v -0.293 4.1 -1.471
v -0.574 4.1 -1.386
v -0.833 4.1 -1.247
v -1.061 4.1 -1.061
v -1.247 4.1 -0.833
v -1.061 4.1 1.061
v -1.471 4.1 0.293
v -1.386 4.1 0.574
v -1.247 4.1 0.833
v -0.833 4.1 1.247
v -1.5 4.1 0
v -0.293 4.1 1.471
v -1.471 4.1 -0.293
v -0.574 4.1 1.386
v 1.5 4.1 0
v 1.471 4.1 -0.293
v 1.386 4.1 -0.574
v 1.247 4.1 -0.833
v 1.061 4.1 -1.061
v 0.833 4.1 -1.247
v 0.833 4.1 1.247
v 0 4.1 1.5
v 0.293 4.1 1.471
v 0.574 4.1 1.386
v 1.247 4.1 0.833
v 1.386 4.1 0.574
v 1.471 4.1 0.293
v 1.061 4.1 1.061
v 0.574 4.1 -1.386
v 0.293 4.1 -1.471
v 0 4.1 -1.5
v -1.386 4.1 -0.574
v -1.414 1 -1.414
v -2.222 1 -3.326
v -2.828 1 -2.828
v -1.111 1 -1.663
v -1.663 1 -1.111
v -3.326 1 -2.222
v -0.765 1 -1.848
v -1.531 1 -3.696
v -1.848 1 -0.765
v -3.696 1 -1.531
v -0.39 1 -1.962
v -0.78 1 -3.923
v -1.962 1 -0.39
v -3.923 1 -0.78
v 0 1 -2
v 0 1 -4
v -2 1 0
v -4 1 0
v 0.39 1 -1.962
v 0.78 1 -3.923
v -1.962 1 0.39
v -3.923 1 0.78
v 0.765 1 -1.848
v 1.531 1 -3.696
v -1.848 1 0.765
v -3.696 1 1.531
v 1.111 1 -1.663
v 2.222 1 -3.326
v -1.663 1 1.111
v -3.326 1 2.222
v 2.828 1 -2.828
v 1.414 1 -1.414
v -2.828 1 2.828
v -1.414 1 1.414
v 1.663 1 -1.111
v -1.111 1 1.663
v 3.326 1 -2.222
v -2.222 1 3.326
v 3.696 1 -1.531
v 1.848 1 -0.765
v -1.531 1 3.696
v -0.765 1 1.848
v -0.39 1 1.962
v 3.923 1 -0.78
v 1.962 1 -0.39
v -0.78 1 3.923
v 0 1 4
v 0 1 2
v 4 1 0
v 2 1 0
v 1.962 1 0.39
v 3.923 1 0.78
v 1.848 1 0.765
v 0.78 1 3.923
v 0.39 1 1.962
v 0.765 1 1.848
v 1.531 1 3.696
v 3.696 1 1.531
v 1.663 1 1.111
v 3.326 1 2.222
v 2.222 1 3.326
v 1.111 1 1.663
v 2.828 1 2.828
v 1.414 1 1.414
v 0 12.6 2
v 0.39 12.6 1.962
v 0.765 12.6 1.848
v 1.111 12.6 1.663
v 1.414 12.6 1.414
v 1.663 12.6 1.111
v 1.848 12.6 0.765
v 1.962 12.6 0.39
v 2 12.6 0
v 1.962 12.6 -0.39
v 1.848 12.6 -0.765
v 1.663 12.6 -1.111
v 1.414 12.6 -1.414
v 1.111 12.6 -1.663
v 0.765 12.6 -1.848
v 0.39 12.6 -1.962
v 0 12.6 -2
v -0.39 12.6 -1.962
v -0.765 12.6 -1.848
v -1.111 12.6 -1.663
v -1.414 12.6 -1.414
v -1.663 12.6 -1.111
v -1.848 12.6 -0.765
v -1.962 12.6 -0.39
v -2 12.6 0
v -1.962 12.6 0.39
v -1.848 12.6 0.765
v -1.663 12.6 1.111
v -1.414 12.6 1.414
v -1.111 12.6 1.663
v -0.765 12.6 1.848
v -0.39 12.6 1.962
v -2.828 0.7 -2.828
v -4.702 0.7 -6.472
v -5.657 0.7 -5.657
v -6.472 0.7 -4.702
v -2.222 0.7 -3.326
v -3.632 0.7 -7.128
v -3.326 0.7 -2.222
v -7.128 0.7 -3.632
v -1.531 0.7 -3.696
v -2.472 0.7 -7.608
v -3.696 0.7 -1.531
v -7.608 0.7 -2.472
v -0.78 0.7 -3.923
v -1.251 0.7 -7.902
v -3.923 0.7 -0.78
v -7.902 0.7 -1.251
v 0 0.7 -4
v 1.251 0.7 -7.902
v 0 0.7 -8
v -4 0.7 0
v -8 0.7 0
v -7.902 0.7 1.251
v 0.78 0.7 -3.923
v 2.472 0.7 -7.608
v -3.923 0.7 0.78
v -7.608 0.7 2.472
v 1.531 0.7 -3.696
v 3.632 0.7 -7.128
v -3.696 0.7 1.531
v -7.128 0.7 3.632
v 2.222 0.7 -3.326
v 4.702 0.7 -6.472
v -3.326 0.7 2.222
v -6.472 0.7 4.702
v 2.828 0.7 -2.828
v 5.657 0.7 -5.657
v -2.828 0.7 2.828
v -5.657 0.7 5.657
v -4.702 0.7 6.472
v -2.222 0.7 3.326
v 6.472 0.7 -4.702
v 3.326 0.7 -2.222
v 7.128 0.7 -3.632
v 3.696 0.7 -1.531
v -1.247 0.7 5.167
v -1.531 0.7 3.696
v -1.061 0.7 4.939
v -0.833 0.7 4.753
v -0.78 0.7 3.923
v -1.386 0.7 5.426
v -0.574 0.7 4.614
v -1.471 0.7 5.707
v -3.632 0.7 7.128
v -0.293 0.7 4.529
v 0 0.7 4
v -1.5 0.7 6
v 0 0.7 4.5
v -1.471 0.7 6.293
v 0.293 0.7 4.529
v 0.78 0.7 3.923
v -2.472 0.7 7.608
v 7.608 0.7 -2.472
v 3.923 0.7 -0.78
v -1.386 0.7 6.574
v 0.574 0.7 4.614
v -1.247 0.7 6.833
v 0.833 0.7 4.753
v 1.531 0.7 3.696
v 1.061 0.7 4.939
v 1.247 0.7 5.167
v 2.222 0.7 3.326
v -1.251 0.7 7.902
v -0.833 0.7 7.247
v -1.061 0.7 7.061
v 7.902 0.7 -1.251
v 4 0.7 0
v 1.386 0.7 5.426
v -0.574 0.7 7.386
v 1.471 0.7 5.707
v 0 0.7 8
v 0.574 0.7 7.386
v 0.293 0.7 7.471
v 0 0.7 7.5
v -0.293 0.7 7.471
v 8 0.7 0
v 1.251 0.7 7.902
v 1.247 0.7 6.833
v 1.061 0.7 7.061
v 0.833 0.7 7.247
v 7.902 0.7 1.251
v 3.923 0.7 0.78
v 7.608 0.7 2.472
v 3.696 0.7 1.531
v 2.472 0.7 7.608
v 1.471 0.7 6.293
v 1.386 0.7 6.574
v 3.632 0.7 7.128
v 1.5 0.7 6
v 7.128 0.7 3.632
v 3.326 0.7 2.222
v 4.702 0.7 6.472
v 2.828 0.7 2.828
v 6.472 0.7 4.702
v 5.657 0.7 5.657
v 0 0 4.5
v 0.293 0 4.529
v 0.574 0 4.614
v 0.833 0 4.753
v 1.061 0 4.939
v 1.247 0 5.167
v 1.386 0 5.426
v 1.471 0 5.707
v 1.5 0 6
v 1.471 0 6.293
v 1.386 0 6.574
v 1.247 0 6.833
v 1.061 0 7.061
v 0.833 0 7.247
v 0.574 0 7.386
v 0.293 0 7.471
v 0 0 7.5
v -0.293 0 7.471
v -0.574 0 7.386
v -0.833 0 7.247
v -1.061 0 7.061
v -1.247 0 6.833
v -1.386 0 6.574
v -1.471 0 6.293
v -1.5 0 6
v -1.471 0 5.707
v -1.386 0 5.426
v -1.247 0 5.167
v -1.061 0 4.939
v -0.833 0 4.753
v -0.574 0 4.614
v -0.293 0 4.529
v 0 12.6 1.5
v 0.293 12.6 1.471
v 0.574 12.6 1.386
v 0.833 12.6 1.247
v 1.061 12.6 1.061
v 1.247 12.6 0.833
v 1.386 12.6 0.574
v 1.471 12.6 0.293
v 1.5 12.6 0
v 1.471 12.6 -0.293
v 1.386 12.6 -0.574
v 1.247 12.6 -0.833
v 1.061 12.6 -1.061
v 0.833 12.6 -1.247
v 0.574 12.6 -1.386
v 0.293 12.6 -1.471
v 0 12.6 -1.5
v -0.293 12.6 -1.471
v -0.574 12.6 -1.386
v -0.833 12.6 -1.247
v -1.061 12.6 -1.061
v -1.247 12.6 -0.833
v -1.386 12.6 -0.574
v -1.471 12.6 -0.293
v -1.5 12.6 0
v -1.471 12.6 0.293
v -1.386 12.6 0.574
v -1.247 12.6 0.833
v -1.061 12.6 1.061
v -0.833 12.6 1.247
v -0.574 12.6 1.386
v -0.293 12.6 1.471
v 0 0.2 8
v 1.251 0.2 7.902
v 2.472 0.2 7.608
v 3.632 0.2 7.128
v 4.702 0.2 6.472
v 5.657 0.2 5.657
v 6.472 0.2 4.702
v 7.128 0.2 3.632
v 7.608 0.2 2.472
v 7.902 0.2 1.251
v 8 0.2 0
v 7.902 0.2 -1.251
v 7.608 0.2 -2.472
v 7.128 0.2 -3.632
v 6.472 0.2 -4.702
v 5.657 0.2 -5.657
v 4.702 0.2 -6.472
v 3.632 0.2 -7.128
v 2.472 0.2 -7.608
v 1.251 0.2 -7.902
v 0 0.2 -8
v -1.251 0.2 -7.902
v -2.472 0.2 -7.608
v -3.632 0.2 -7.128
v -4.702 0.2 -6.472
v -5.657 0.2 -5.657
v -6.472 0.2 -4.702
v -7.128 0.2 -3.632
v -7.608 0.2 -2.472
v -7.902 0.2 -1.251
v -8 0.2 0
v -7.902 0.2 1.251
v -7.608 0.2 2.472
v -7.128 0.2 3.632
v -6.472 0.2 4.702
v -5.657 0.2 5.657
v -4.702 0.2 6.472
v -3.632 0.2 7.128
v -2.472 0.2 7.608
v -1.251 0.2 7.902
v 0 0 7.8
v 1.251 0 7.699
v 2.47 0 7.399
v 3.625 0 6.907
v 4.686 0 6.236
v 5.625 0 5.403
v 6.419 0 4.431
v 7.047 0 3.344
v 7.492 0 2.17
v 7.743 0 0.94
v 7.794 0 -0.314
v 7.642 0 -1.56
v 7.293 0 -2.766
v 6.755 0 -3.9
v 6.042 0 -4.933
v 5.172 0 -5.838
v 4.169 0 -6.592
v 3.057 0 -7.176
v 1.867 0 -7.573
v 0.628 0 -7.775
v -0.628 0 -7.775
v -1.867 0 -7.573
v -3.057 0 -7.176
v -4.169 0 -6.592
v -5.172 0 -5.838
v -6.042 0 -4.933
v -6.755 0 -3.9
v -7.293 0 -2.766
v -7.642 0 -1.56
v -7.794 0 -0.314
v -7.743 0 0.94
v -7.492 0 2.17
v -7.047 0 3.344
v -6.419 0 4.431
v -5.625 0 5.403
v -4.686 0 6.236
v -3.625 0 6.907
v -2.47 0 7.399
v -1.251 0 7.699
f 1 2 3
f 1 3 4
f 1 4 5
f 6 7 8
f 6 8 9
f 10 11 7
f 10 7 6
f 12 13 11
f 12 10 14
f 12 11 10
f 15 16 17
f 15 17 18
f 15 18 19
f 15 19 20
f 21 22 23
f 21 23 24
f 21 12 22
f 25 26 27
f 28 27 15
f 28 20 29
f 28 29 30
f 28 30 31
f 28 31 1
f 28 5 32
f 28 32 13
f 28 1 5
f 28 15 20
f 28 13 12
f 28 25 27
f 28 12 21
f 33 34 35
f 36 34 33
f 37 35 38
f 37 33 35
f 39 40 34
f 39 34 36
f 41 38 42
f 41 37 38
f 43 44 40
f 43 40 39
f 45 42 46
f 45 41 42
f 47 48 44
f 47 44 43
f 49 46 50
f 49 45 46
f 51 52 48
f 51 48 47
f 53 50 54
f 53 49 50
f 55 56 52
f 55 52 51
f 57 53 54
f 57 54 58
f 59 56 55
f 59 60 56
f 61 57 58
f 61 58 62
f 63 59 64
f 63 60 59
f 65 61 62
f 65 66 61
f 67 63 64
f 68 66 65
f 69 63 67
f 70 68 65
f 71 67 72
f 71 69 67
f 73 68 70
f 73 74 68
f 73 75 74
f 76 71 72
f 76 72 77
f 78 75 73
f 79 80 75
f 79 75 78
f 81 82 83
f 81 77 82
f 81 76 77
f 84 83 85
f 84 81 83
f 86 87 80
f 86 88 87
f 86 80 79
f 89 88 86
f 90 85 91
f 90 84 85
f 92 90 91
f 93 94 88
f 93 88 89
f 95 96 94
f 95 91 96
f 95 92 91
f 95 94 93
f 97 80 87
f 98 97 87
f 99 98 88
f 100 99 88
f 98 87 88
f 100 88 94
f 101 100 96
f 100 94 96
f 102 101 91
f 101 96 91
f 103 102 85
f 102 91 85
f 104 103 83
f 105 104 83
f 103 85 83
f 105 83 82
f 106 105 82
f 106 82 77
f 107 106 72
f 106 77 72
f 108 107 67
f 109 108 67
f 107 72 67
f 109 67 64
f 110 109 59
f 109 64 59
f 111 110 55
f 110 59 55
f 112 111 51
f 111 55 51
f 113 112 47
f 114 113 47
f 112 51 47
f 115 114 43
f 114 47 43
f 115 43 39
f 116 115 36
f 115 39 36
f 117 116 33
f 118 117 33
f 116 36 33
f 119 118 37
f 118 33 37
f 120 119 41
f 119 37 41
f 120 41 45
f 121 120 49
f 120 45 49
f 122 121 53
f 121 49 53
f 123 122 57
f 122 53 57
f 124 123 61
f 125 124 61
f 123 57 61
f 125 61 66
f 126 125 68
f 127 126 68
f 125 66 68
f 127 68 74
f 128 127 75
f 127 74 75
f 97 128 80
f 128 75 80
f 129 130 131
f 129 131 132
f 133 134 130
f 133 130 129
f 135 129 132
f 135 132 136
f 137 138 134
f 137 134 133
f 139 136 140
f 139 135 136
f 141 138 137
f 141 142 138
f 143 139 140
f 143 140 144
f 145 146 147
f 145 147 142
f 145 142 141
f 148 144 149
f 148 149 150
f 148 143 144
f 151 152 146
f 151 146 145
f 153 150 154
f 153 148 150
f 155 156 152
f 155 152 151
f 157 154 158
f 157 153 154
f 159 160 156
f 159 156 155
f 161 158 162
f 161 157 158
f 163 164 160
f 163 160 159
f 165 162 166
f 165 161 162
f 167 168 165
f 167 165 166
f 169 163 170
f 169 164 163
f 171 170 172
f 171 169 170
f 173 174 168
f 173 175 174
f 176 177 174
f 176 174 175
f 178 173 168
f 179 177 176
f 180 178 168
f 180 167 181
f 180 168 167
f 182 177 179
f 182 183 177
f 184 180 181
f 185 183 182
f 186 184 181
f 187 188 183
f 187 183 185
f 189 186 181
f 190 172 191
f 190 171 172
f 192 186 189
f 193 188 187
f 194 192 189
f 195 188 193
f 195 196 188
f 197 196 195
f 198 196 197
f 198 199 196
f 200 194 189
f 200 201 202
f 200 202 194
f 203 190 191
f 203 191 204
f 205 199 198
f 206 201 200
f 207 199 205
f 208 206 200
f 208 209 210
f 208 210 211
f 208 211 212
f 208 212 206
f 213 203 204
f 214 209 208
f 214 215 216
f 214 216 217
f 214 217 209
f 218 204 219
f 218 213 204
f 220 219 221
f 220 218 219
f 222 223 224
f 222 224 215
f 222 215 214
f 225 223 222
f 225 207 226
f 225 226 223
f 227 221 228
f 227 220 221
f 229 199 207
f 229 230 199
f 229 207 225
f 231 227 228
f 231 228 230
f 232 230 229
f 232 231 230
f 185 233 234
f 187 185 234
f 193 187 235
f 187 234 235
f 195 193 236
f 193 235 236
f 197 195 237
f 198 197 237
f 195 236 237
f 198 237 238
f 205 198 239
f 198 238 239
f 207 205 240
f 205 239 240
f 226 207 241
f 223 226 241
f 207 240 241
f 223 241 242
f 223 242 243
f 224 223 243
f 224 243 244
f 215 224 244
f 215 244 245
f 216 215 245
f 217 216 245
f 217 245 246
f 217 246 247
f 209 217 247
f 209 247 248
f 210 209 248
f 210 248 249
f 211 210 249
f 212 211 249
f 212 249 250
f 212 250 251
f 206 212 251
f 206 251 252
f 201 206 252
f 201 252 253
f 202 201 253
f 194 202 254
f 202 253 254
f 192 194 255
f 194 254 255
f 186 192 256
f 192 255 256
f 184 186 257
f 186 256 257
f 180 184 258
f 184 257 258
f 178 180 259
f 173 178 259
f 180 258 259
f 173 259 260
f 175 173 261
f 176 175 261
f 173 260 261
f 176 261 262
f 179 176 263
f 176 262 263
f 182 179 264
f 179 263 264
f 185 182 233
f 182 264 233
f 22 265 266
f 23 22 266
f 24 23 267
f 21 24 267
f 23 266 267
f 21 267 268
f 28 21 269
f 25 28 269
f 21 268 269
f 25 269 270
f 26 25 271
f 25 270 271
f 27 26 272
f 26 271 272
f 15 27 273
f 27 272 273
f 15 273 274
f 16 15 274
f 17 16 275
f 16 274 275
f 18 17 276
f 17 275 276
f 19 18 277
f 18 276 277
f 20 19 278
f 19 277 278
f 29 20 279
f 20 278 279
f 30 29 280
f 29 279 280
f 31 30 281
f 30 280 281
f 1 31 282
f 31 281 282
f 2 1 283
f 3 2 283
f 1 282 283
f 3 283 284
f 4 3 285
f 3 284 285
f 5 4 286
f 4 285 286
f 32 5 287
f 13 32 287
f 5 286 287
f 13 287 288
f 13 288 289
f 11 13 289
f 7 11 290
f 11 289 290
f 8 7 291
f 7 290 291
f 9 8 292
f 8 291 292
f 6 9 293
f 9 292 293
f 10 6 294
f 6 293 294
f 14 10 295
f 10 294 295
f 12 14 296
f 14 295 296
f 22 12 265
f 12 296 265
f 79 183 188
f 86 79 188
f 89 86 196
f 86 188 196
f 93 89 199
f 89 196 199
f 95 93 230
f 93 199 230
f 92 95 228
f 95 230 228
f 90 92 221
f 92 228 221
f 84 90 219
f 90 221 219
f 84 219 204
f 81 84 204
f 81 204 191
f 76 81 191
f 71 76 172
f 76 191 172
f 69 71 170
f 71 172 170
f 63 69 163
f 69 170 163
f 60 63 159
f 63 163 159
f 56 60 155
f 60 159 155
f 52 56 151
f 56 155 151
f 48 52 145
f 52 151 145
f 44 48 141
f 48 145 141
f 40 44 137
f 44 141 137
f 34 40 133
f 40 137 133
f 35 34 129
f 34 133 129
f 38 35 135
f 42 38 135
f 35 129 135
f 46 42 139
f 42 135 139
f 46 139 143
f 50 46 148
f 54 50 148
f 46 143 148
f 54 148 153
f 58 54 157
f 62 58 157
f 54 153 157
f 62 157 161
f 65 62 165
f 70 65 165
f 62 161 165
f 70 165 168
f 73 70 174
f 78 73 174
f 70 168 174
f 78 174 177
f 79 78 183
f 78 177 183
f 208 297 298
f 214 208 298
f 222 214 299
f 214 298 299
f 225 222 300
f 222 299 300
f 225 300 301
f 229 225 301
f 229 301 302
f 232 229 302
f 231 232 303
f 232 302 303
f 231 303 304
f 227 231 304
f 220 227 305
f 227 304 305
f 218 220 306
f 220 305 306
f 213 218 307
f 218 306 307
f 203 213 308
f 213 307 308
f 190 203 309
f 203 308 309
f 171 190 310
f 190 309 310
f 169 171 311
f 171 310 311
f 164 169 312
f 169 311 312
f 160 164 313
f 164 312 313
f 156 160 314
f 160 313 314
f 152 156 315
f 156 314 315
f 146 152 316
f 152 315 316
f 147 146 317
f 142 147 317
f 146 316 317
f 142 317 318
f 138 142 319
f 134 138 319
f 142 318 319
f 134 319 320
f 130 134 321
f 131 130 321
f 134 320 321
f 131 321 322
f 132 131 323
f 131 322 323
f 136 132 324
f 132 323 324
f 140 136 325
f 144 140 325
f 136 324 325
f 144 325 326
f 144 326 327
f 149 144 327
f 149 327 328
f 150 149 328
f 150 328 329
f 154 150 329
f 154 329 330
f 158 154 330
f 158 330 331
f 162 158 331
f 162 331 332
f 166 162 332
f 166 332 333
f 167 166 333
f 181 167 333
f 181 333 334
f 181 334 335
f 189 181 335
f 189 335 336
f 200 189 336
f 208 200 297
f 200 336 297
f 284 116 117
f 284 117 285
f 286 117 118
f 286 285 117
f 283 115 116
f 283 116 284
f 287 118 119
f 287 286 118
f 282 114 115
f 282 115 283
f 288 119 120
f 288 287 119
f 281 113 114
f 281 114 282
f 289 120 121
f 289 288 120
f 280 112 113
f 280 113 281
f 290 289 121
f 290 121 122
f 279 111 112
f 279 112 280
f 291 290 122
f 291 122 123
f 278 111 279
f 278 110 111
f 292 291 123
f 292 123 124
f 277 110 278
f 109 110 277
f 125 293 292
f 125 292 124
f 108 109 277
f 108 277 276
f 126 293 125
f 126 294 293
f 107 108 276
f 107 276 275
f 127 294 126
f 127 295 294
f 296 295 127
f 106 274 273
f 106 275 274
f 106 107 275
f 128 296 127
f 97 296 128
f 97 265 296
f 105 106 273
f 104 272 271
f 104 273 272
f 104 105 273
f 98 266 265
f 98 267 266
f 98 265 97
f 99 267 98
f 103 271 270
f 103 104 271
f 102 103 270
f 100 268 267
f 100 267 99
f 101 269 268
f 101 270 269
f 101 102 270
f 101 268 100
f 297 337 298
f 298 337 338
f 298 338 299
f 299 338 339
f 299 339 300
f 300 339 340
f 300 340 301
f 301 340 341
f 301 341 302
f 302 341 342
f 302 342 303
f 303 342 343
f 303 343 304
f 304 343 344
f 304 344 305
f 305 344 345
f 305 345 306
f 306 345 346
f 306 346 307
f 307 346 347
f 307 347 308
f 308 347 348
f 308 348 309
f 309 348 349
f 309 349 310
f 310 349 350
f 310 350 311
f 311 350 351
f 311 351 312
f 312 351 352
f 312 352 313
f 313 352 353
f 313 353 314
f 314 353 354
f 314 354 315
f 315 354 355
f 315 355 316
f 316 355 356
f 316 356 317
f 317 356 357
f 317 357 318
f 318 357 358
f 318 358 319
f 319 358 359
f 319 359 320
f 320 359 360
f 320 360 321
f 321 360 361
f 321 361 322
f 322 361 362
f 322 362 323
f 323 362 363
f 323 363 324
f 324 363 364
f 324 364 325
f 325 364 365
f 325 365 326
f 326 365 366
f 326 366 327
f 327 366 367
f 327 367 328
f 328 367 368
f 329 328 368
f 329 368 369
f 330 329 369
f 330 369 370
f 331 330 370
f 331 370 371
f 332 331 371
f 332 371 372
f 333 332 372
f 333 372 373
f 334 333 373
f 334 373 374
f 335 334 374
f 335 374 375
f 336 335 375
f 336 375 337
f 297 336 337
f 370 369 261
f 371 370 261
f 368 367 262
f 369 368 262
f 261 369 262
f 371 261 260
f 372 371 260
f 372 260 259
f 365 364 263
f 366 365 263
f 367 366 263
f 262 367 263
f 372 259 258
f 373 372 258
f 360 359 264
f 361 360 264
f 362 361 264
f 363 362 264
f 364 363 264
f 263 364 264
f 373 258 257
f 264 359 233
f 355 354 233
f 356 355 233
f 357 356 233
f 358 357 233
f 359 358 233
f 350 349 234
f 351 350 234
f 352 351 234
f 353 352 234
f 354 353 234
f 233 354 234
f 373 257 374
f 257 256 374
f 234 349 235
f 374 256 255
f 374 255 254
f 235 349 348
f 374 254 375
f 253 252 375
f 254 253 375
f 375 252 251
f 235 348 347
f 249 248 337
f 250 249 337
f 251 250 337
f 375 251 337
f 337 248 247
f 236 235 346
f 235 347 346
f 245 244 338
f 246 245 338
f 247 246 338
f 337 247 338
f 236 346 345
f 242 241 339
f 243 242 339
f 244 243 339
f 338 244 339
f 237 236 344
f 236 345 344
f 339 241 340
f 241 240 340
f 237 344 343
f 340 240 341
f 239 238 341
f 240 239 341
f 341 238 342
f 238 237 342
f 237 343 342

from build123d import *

# Parameters (mm, degrees)
SKETCH1_R           = 8
BOSS_EXTRUDE1_DEPTH = 0.7
SKETCH2_R           = 4
BOSS_EXTRUDE2_DEPTH = 0.3
SKETCH3_R           = 2
BOSS_EXTRUDE3_DEPTH = 11.6
SKETCH4_R           = 1.5
CUT_EXTRUDE1_DEPTH  = 8.5
SKETCH5_R           = 1.5
CUT_EXTRUDE2_DEPTH  = 17.933989489
CHAMFER1_SIZE       = 0.2


with BuildPart() as part:
    # Sketch1 → Boss-Extrude1 (new body)
    with BuildSketch(Plane(origin=(0, 0, 0), x_dir=(1, 0, 0), z_dir=(0, 1, 0))):
        with Locations(Location((0, 0, 0), (0, 0, 270))):
            Circle(SKETCH1_R)
    extrude(amount=BOSS_EXTRUDE1_DEPTH)

    # Sketch2 → Boss-Extrude2 (add)
    with BuildSketch(Plane(origin=(0, 0.7, 0), x_dir=(1, 0, 0), z_dir=(0, 1, 0))):
        with Locations(Location((0, 0, 0), (0, 0, 270))):
            Circle(SKETCH2_R)
    extrude(amount=BOSS_EXTRUDE2_DEPTH)

    # Sketch3 → Boss-Extrude3 (add)
    with BuildSketch(Plane(origin=(0, 1, 0), x_dir=(1, 0, 0), z_dir=(0, 1, 0))):
        with Locations(Location((0, 0, 0), (0, 0, 270))):
            Circle(SKETCH3_R)
    extrude(amount=BOSS_EXTRUDE3_DEPTH)

    # Sketch4 → Cut-Extrude1 (cut)
    with BuildSketch(Plane(origin=(0, 12.6, 0), x_dir=(1, 0, 0), z_dir=(0, 1, 0))):
        with Locations(Location((0, 0, 0), (0, 0, 270))):
            Circle(SKETCH4_R)
    extrude(amount=-CUT_EXTRUDE1_DEPTH, mode=Mode.SUBTRACT)

    # Sketch5 → Cut-Extrude2 (cut, through all)
    with BuildSketch(Plane.XZ):
        with Locations(Location((0, 6, 0), (0, 0, 270))):
            Circle(SKETCH5_R)
    extrude(amount=-CUT_EXTRUDE2_DEPTH, mode=Mode.SUBTRACT)

    # Chamfer1
    chamfer1_edges = [part.edges().sort_by_distance(p)[0] for p in [
        (0, 0, -8),
    ]]
    chamfer(chamfer1_edges, length=CHAMFER1_SIZE)


solid = part.part
